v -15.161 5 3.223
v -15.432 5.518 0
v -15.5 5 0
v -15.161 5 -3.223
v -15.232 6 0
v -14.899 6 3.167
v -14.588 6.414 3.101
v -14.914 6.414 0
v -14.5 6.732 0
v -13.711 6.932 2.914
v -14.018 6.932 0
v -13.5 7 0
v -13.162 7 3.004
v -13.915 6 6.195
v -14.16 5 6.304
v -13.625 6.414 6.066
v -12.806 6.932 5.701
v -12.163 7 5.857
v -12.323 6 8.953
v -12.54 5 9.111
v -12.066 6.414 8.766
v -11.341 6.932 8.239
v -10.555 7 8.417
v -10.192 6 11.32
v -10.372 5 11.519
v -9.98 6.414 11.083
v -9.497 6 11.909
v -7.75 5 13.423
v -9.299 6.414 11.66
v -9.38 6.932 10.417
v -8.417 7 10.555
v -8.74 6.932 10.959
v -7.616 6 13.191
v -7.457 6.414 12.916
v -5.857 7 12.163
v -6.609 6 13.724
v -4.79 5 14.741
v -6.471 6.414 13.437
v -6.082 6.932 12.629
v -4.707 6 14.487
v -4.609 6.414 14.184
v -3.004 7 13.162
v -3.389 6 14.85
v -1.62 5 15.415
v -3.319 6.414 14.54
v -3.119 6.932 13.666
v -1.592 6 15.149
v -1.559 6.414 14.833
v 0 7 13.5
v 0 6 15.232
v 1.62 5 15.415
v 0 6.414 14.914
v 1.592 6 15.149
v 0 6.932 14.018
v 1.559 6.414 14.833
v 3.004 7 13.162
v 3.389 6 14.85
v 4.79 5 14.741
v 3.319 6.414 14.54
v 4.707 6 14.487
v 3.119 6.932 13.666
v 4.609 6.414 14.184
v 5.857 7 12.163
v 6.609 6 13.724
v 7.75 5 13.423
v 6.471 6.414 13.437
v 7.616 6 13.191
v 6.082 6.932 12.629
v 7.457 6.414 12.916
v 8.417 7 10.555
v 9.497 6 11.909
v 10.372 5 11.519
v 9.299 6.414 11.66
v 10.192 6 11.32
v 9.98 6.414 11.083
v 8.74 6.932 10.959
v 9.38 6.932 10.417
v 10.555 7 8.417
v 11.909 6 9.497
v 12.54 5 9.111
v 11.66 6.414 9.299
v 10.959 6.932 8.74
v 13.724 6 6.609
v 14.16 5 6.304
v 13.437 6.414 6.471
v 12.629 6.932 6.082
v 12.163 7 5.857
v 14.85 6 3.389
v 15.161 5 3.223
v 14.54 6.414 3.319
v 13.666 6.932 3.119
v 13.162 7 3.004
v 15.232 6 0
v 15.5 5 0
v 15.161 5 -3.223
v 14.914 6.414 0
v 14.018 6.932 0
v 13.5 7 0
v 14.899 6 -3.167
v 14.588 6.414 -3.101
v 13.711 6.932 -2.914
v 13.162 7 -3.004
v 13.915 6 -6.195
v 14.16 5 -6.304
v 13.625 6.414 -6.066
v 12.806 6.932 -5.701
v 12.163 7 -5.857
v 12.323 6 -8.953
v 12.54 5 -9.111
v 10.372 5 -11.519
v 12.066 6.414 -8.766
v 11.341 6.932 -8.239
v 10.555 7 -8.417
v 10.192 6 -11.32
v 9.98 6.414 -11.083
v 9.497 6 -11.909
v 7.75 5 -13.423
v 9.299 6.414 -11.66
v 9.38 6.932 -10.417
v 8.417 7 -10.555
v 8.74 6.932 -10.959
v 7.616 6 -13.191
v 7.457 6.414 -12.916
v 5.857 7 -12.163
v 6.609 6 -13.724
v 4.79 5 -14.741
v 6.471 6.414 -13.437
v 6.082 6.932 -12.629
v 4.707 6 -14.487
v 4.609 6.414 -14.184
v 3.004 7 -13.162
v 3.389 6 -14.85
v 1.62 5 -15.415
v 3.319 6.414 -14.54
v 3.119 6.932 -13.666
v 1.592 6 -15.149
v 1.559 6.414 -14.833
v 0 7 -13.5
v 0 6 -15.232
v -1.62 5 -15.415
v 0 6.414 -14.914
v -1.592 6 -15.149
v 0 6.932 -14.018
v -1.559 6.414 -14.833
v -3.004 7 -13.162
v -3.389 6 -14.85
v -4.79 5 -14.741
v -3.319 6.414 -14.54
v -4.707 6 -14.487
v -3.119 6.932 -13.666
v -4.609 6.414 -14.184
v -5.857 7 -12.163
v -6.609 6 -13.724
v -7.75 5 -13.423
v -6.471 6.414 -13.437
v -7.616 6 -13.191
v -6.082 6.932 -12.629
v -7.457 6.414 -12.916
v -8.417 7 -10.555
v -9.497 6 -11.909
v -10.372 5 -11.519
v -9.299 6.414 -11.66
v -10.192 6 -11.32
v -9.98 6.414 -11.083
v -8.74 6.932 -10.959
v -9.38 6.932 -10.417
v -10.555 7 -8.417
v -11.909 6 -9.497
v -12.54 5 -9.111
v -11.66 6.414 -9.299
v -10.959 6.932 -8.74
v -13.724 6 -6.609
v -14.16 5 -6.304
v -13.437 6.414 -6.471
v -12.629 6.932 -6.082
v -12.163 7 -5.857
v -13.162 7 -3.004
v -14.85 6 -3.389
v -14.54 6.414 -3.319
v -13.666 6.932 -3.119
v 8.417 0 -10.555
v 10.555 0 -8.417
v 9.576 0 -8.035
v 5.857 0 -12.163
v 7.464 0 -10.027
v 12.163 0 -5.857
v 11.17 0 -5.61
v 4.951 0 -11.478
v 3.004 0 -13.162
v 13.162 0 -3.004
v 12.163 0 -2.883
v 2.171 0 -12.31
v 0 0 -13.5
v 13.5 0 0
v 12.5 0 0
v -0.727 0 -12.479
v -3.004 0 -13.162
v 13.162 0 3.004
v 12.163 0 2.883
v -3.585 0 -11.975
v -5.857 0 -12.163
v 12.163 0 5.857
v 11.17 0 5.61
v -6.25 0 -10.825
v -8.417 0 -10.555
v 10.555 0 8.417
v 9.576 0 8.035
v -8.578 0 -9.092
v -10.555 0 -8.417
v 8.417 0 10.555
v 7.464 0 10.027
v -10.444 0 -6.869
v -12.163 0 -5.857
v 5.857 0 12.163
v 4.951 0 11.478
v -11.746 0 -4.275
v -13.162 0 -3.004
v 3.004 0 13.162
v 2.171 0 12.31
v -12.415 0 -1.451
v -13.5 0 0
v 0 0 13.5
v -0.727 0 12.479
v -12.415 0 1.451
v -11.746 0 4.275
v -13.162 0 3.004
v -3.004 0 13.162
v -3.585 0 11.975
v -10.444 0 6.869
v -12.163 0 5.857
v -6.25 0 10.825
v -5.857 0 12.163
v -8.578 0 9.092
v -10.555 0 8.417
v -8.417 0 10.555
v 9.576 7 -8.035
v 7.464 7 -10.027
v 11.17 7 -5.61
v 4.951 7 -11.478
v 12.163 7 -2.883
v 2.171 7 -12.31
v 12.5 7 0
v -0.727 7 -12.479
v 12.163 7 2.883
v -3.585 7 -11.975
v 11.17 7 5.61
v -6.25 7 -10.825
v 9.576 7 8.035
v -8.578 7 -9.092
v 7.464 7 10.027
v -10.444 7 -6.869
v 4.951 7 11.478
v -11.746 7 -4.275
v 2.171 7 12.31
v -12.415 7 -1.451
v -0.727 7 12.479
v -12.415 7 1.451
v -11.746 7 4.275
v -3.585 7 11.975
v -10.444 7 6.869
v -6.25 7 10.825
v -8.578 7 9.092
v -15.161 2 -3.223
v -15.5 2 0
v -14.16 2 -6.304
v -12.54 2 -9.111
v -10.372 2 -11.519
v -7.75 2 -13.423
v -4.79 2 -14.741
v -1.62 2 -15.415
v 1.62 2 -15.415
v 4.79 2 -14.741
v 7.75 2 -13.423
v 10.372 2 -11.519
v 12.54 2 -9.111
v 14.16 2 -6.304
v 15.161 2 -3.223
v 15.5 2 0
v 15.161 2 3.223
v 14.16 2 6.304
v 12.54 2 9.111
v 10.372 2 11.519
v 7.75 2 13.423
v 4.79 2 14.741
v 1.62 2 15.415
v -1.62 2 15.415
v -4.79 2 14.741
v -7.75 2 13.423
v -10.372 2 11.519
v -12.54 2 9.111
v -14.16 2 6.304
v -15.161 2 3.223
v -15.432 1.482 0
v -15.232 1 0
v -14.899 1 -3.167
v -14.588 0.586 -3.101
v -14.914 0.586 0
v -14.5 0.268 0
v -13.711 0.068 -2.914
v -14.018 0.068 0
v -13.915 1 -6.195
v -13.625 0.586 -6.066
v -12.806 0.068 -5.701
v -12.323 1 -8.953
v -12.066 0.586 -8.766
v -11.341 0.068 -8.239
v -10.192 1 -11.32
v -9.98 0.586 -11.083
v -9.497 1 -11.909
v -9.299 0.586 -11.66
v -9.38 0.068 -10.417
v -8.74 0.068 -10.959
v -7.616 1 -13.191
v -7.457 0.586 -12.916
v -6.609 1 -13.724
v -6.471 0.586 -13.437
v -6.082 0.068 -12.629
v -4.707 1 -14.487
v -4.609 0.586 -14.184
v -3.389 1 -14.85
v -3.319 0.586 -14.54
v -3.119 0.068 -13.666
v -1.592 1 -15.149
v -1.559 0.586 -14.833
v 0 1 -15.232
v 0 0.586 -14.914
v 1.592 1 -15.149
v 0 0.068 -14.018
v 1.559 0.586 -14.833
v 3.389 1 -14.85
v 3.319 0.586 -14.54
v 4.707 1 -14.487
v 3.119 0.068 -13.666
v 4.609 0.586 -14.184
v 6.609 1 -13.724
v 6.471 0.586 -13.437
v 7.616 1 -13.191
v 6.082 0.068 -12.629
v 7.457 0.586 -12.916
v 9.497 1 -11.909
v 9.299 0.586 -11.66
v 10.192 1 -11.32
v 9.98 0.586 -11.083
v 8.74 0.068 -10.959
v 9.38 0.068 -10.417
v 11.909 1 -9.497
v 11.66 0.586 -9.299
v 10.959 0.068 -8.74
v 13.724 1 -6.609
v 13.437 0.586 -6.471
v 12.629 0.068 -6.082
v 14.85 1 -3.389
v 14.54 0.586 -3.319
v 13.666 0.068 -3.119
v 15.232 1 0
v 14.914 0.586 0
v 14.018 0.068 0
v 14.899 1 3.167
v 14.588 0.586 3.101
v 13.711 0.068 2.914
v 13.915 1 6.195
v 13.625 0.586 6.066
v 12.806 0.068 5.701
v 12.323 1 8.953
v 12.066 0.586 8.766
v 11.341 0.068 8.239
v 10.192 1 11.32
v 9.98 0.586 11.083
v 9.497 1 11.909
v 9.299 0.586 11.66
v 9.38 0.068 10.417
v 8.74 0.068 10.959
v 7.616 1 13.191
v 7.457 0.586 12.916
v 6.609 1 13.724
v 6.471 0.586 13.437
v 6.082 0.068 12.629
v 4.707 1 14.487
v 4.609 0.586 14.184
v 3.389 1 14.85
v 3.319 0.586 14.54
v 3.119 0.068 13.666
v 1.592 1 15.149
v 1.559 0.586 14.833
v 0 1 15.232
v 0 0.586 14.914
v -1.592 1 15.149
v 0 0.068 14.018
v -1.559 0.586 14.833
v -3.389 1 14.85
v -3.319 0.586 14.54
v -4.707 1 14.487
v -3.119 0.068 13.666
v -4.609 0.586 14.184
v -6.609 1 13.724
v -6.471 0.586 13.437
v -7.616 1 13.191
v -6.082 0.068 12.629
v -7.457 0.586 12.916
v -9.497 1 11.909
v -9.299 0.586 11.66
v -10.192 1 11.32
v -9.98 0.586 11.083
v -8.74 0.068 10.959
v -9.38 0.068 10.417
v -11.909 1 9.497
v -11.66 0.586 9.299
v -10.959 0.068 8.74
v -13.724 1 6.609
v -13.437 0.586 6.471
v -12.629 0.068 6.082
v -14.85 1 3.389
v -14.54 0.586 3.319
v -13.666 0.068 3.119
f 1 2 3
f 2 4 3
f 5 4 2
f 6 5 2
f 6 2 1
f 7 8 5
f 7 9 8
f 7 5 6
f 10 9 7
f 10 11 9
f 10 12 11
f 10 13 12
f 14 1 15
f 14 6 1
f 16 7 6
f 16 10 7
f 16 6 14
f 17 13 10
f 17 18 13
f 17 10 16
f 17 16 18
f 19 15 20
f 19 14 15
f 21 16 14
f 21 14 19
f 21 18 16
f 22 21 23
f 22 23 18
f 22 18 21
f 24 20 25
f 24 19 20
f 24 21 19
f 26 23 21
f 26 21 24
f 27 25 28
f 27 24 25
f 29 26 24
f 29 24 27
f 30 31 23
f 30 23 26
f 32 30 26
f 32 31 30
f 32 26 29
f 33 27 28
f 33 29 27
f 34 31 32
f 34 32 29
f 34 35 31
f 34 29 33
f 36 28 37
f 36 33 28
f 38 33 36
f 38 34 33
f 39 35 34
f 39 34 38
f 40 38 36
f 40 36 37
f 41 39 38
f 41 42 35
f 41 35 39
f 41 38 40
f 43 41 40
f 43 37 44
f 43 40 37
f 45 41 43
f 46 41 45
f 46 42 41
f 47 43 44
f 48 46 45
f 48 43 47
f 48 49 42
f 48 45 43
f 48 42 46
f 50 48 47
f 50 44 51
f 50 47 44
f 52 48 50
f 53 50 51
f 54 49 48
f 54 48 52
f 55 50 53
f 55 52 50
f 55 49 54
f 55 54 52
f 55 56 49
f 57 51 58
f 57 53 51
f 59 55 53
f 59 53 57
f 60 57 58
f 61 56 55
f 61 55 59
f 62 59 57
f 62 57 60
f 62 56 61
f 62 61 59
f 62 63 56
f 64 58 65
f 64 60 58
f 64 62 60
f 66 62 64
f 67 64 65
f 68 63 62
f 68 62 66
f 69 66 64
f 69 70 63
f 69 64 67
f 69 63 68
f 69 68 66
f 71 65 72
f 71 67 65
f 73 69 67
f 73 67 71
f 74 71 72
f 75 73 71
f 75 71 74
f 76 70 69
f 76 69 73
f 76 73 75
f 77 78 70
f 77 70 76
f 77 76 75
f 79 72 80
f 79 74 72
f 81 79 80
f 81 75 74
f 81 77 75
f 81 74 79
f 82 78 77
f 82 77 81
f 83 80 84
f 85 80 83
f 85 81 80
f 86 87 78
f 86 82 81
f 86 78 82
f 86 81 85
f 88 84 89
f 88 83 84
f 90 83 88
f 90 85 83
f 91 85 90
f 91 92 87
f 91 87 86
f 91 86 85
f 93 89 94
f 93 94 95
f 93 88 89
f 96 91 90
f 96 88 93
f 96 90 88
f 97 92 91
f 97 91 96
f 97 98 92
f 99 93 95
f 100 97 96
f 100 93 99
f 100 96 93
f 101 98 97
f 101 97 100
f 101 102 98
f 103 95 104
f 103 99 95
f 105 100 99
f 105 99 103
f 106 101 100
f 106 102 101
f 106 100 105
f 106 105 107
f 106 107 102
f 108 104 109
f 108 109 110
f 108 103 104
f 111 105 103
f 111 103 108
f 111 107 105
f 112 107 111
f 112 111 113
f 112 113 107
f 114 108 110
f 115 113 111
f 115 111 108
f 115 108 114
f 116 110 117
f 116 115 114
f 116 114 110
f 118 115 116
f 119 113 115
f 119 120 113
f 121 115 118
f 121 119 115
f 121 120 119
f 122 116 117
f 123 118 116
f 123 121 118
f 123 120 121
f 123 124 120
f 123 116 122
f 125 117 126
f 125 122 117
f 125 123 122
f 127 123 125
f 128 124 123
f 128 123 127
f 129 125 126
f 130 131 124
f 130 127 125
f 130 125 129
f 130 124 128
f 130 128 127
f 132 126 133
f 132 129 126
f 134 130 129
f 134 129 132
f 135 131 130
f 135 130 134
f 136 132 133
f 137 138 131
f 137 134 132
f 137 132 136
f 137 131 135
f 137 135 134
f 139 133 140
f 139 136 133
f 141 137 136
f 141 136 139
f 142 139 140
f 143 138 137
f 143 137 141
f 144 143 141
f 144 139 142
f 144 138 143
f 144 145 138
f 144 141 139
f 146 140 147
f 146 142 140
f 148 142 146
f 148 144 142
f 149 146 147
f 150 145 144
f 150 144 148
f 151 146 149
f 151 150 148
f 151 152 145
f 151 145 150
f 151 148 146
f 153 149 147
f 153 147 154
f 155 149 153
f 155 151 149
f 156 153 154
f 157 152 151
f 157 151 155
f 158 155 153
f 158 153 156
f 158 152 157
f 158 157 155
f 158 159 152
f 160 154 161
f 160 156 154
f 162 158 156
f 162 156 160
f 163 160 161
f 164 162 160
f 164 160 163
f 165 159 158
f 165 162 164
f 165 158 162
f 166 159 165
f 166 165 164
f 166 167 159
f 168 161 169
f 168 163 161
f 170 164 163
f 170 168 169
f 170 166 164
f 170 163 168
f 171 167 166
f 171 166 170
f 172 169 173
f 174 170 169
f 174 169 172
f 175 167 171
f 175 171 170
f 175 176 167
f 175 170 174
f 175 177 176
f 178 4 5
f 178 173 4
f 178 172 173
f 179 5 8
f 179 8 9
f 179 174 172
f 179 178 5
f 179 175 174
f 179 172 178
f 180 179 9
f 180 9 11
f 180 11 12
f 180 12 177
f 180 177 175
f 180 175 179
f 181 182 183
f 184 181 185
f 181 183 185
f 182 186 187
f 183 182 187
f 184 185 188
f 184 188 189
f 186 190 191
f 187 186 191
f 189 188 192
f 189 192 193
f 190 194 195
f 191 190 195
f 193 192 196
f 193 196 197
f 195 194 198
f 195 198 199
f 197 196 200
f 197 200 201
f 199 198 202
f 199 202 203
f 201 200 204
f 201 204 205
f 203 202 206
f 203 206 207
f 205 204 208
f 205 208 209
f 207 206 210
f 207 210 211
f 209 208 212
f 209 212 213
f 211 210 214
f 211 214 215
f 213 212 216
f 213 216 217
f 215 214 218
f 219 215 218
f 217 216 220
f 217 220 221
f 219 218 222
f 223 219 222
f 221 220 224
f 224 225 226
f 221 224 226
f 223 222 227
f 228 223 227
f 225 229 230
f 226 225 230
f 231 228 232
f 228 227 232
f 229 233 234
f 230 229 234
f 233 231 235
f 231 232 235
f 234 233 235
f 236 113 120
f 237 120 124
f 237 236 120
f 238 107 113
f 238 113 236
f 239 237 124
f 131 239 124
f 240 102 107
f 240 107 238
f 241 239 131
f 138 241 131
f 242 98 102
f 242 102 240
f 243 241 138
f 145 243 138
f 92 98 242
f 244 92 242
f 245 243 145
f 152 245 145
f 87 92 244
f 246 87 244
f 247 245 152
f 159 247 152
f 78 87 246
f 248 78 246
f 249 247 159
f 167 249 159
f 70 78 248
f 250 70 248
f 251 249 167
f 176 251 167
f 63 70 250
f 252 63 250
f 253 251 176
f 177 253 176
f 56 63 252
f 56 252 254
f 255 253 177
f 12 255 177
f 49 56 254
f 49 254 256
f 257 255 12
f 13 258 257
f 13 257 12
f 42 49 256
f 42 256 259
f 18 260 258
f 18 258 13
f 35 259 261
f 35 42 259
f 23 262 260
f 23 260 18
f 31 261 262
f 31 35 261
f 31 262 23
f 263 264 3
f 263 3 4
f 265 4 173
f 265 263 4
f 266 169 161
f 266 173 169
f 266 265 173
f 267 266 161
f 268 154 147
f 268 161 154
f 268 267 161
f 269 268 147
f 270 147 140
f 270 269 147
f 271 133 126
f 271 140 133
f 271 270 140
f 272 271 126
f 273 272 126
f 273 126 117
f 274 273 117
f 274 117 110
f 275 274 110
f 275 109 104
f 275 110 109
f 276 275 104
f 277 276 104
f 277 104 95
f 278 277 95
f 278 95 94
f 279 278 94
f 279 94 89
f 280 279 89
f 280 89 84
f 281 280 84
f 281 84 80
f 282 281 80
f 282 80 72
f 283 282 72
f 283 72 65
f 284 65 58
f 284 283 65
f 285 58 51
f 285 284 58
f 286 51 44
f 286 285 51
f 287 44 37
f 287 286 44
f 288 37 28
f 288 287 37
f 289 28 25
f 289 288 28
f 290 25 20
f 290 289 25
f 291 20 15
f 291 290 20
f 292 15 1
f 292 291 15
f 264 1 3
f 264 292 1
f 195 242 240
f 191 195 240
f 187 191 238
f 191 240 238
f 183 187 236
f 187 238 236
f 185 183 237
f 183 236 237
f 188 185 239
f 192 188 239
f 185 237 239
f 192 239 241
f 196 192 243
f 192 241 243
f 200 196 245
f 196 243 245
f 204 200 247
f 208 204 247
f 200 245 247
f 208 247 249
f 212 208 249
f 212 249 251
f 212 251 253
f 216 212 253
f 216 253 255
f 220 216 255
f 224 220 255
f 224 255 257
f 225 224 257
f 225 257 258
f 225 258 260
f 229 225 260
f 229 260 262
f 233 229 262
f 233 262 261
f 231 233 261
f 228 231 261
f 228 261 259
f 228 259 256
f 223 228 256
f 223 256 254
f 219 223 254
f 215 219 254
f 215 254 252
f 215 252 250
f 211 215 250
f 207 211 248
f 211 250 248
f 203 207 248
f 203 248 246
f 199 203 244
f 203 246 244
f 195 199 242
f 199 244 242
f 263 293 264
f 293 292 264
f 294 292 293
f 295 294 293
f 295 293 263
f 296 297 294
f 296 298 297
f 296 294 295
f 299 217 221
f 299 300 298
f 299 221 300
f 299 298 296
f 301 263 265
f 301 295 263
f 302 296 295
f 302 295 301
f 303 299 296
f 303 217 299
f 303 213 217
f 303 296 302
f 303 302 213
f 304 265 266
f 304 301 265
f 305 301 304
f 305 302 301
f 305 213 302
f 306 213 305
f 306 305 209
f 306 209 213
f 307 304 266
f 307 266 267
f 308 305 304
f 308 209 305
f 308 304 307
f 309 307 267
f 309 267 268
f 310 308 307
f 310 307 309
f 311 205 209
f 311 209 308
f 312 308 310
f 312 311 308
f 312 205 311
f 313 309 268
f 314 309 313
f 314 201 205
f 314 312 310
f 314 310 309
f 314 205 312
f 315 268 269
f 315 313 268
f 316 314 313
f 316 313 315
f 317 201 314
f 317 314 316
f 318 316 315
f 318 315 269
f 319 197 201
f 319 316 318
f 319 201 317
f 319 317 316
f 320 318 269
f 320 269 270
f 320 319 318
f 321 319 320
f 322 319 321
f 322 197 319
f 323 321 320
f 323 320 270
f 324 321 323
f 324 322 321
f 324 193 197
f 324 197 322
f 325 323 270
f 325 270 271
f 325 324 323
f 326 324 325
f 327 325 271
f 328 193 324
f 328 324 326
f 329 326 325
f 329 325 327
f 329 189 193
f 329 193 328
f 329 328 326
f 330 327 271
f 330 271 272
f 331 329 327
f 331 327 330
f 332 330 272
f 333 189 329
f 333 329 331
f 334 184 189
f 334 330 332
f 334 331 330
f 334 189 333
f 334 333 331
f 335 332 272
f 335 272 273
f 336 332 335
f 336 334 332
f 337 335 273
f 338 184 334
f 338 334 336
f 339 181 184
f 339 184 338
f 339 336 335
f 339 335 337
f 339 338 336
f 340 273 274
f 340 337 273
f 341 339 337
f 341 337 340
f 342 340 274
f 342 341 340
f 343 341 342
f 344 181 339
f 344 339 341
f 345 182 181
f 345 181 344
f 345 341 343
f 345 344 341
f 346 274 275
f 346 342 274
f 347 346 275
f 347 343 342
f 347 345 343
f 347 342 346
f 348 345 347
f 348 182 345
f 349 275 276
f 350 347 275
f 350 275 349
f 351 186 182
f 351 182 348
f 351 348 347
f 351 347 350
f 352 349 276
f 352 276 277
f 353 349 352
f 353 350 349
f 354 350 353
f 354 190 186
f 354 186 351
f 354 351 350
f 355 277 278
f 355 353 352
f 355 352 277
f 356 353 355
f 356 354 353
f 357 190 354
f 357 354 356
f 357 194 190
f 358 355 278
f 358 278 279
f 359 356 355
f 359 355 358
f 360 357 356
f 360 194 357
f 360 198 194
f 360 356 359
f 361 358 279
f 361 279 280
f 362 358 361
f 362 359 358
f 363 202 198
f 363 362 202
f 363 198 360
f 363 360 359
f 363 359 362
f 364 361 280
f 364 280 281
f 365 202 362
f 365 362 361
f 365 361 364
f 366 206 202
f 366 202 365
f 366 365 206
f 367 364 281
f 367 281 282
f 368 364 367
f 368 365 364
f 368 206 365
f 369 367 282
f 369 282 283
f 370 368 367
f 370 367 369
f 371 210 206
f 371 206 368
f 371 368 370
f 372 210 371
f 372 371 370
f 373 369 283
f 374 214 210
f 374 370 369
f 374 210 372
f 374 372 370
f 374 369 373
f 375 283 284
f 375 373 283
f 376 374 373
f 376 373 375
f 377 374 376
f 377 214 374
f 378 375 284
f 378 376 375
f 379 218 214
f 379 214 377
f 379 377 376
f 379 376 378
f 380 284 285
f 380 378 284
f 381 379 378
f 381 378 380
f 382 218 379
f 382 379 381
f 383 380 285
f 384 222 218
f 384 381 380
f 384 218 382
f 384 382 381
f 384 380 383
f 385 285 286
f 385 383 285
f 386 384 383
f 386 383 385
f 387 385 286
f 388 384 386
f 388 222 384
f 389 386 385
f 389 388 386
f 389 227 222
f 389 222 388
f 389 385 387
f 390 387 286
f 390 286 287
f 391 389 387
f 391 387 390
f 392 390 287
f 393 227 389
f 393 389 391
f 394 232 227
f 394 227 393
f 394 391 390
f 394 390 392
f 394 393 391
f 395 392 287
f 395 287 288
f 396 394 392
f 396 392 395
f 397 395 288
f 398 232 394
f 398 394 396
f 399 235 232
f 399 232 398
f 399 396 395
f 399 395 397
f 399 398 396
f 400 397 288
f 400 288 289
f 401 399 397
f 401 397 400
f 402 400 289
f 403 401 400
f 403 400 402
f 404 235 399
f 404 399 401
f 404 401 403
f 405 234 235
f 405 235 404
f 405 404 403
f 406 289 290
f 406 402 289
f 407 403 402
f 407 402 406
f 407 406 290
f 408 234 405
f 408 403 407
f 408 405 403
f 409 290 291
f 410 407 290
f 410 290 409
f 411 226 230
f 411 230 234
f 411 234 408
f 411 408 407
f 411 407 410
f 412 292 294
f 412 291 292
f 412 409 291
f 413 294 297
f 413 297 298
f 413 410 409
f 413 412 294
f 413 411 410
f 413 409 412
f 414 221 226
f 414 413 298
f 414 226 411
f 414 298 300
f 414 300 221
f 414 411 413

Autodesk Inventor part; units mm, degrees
ref_plane "YZ Plane" through (0, 0, 0) normal (1, 0, 0) x (0, 1, 0)
ref_plane "XZ Plane" through (0, 0, 0) normal (0, 1, 0) x (-1, 0, 0)
ref_plane "XY Plane" through (0, 0, 0) normal (0, 0, 1) x (1, 0, 0)
sketch "Esquisse1" plane through (0, 0, 0) normal (0, 1, 0) x (-1, 0, 0)
  circle A0 centre (0, 0) radius 15.5
  dimension "d0" = 31
extrude "Extrusion1" add sketch "Esquisse1" along normal blind 7
fillet "Congé1" radius 2 1 edges at (15.5, 7, 0)
fillet "Congé2" radius 2 1 edges at (15.5, 0, 0)
sketch "Esquisse3" plane through (0, 7, 0) normal (0, 1, 0) x (1, 0, 0)
  circle A0 centre (0, 0) radius 12.5
  dimension "d10" = 25
extrude "Extrusion2" cut sketch "Esquisse3" against normal blind 10
thread "Filetage3" size "M25x2" class "6H" standard "ANSI Metric M Profile" length 7
properties part number "Anneau interm"
